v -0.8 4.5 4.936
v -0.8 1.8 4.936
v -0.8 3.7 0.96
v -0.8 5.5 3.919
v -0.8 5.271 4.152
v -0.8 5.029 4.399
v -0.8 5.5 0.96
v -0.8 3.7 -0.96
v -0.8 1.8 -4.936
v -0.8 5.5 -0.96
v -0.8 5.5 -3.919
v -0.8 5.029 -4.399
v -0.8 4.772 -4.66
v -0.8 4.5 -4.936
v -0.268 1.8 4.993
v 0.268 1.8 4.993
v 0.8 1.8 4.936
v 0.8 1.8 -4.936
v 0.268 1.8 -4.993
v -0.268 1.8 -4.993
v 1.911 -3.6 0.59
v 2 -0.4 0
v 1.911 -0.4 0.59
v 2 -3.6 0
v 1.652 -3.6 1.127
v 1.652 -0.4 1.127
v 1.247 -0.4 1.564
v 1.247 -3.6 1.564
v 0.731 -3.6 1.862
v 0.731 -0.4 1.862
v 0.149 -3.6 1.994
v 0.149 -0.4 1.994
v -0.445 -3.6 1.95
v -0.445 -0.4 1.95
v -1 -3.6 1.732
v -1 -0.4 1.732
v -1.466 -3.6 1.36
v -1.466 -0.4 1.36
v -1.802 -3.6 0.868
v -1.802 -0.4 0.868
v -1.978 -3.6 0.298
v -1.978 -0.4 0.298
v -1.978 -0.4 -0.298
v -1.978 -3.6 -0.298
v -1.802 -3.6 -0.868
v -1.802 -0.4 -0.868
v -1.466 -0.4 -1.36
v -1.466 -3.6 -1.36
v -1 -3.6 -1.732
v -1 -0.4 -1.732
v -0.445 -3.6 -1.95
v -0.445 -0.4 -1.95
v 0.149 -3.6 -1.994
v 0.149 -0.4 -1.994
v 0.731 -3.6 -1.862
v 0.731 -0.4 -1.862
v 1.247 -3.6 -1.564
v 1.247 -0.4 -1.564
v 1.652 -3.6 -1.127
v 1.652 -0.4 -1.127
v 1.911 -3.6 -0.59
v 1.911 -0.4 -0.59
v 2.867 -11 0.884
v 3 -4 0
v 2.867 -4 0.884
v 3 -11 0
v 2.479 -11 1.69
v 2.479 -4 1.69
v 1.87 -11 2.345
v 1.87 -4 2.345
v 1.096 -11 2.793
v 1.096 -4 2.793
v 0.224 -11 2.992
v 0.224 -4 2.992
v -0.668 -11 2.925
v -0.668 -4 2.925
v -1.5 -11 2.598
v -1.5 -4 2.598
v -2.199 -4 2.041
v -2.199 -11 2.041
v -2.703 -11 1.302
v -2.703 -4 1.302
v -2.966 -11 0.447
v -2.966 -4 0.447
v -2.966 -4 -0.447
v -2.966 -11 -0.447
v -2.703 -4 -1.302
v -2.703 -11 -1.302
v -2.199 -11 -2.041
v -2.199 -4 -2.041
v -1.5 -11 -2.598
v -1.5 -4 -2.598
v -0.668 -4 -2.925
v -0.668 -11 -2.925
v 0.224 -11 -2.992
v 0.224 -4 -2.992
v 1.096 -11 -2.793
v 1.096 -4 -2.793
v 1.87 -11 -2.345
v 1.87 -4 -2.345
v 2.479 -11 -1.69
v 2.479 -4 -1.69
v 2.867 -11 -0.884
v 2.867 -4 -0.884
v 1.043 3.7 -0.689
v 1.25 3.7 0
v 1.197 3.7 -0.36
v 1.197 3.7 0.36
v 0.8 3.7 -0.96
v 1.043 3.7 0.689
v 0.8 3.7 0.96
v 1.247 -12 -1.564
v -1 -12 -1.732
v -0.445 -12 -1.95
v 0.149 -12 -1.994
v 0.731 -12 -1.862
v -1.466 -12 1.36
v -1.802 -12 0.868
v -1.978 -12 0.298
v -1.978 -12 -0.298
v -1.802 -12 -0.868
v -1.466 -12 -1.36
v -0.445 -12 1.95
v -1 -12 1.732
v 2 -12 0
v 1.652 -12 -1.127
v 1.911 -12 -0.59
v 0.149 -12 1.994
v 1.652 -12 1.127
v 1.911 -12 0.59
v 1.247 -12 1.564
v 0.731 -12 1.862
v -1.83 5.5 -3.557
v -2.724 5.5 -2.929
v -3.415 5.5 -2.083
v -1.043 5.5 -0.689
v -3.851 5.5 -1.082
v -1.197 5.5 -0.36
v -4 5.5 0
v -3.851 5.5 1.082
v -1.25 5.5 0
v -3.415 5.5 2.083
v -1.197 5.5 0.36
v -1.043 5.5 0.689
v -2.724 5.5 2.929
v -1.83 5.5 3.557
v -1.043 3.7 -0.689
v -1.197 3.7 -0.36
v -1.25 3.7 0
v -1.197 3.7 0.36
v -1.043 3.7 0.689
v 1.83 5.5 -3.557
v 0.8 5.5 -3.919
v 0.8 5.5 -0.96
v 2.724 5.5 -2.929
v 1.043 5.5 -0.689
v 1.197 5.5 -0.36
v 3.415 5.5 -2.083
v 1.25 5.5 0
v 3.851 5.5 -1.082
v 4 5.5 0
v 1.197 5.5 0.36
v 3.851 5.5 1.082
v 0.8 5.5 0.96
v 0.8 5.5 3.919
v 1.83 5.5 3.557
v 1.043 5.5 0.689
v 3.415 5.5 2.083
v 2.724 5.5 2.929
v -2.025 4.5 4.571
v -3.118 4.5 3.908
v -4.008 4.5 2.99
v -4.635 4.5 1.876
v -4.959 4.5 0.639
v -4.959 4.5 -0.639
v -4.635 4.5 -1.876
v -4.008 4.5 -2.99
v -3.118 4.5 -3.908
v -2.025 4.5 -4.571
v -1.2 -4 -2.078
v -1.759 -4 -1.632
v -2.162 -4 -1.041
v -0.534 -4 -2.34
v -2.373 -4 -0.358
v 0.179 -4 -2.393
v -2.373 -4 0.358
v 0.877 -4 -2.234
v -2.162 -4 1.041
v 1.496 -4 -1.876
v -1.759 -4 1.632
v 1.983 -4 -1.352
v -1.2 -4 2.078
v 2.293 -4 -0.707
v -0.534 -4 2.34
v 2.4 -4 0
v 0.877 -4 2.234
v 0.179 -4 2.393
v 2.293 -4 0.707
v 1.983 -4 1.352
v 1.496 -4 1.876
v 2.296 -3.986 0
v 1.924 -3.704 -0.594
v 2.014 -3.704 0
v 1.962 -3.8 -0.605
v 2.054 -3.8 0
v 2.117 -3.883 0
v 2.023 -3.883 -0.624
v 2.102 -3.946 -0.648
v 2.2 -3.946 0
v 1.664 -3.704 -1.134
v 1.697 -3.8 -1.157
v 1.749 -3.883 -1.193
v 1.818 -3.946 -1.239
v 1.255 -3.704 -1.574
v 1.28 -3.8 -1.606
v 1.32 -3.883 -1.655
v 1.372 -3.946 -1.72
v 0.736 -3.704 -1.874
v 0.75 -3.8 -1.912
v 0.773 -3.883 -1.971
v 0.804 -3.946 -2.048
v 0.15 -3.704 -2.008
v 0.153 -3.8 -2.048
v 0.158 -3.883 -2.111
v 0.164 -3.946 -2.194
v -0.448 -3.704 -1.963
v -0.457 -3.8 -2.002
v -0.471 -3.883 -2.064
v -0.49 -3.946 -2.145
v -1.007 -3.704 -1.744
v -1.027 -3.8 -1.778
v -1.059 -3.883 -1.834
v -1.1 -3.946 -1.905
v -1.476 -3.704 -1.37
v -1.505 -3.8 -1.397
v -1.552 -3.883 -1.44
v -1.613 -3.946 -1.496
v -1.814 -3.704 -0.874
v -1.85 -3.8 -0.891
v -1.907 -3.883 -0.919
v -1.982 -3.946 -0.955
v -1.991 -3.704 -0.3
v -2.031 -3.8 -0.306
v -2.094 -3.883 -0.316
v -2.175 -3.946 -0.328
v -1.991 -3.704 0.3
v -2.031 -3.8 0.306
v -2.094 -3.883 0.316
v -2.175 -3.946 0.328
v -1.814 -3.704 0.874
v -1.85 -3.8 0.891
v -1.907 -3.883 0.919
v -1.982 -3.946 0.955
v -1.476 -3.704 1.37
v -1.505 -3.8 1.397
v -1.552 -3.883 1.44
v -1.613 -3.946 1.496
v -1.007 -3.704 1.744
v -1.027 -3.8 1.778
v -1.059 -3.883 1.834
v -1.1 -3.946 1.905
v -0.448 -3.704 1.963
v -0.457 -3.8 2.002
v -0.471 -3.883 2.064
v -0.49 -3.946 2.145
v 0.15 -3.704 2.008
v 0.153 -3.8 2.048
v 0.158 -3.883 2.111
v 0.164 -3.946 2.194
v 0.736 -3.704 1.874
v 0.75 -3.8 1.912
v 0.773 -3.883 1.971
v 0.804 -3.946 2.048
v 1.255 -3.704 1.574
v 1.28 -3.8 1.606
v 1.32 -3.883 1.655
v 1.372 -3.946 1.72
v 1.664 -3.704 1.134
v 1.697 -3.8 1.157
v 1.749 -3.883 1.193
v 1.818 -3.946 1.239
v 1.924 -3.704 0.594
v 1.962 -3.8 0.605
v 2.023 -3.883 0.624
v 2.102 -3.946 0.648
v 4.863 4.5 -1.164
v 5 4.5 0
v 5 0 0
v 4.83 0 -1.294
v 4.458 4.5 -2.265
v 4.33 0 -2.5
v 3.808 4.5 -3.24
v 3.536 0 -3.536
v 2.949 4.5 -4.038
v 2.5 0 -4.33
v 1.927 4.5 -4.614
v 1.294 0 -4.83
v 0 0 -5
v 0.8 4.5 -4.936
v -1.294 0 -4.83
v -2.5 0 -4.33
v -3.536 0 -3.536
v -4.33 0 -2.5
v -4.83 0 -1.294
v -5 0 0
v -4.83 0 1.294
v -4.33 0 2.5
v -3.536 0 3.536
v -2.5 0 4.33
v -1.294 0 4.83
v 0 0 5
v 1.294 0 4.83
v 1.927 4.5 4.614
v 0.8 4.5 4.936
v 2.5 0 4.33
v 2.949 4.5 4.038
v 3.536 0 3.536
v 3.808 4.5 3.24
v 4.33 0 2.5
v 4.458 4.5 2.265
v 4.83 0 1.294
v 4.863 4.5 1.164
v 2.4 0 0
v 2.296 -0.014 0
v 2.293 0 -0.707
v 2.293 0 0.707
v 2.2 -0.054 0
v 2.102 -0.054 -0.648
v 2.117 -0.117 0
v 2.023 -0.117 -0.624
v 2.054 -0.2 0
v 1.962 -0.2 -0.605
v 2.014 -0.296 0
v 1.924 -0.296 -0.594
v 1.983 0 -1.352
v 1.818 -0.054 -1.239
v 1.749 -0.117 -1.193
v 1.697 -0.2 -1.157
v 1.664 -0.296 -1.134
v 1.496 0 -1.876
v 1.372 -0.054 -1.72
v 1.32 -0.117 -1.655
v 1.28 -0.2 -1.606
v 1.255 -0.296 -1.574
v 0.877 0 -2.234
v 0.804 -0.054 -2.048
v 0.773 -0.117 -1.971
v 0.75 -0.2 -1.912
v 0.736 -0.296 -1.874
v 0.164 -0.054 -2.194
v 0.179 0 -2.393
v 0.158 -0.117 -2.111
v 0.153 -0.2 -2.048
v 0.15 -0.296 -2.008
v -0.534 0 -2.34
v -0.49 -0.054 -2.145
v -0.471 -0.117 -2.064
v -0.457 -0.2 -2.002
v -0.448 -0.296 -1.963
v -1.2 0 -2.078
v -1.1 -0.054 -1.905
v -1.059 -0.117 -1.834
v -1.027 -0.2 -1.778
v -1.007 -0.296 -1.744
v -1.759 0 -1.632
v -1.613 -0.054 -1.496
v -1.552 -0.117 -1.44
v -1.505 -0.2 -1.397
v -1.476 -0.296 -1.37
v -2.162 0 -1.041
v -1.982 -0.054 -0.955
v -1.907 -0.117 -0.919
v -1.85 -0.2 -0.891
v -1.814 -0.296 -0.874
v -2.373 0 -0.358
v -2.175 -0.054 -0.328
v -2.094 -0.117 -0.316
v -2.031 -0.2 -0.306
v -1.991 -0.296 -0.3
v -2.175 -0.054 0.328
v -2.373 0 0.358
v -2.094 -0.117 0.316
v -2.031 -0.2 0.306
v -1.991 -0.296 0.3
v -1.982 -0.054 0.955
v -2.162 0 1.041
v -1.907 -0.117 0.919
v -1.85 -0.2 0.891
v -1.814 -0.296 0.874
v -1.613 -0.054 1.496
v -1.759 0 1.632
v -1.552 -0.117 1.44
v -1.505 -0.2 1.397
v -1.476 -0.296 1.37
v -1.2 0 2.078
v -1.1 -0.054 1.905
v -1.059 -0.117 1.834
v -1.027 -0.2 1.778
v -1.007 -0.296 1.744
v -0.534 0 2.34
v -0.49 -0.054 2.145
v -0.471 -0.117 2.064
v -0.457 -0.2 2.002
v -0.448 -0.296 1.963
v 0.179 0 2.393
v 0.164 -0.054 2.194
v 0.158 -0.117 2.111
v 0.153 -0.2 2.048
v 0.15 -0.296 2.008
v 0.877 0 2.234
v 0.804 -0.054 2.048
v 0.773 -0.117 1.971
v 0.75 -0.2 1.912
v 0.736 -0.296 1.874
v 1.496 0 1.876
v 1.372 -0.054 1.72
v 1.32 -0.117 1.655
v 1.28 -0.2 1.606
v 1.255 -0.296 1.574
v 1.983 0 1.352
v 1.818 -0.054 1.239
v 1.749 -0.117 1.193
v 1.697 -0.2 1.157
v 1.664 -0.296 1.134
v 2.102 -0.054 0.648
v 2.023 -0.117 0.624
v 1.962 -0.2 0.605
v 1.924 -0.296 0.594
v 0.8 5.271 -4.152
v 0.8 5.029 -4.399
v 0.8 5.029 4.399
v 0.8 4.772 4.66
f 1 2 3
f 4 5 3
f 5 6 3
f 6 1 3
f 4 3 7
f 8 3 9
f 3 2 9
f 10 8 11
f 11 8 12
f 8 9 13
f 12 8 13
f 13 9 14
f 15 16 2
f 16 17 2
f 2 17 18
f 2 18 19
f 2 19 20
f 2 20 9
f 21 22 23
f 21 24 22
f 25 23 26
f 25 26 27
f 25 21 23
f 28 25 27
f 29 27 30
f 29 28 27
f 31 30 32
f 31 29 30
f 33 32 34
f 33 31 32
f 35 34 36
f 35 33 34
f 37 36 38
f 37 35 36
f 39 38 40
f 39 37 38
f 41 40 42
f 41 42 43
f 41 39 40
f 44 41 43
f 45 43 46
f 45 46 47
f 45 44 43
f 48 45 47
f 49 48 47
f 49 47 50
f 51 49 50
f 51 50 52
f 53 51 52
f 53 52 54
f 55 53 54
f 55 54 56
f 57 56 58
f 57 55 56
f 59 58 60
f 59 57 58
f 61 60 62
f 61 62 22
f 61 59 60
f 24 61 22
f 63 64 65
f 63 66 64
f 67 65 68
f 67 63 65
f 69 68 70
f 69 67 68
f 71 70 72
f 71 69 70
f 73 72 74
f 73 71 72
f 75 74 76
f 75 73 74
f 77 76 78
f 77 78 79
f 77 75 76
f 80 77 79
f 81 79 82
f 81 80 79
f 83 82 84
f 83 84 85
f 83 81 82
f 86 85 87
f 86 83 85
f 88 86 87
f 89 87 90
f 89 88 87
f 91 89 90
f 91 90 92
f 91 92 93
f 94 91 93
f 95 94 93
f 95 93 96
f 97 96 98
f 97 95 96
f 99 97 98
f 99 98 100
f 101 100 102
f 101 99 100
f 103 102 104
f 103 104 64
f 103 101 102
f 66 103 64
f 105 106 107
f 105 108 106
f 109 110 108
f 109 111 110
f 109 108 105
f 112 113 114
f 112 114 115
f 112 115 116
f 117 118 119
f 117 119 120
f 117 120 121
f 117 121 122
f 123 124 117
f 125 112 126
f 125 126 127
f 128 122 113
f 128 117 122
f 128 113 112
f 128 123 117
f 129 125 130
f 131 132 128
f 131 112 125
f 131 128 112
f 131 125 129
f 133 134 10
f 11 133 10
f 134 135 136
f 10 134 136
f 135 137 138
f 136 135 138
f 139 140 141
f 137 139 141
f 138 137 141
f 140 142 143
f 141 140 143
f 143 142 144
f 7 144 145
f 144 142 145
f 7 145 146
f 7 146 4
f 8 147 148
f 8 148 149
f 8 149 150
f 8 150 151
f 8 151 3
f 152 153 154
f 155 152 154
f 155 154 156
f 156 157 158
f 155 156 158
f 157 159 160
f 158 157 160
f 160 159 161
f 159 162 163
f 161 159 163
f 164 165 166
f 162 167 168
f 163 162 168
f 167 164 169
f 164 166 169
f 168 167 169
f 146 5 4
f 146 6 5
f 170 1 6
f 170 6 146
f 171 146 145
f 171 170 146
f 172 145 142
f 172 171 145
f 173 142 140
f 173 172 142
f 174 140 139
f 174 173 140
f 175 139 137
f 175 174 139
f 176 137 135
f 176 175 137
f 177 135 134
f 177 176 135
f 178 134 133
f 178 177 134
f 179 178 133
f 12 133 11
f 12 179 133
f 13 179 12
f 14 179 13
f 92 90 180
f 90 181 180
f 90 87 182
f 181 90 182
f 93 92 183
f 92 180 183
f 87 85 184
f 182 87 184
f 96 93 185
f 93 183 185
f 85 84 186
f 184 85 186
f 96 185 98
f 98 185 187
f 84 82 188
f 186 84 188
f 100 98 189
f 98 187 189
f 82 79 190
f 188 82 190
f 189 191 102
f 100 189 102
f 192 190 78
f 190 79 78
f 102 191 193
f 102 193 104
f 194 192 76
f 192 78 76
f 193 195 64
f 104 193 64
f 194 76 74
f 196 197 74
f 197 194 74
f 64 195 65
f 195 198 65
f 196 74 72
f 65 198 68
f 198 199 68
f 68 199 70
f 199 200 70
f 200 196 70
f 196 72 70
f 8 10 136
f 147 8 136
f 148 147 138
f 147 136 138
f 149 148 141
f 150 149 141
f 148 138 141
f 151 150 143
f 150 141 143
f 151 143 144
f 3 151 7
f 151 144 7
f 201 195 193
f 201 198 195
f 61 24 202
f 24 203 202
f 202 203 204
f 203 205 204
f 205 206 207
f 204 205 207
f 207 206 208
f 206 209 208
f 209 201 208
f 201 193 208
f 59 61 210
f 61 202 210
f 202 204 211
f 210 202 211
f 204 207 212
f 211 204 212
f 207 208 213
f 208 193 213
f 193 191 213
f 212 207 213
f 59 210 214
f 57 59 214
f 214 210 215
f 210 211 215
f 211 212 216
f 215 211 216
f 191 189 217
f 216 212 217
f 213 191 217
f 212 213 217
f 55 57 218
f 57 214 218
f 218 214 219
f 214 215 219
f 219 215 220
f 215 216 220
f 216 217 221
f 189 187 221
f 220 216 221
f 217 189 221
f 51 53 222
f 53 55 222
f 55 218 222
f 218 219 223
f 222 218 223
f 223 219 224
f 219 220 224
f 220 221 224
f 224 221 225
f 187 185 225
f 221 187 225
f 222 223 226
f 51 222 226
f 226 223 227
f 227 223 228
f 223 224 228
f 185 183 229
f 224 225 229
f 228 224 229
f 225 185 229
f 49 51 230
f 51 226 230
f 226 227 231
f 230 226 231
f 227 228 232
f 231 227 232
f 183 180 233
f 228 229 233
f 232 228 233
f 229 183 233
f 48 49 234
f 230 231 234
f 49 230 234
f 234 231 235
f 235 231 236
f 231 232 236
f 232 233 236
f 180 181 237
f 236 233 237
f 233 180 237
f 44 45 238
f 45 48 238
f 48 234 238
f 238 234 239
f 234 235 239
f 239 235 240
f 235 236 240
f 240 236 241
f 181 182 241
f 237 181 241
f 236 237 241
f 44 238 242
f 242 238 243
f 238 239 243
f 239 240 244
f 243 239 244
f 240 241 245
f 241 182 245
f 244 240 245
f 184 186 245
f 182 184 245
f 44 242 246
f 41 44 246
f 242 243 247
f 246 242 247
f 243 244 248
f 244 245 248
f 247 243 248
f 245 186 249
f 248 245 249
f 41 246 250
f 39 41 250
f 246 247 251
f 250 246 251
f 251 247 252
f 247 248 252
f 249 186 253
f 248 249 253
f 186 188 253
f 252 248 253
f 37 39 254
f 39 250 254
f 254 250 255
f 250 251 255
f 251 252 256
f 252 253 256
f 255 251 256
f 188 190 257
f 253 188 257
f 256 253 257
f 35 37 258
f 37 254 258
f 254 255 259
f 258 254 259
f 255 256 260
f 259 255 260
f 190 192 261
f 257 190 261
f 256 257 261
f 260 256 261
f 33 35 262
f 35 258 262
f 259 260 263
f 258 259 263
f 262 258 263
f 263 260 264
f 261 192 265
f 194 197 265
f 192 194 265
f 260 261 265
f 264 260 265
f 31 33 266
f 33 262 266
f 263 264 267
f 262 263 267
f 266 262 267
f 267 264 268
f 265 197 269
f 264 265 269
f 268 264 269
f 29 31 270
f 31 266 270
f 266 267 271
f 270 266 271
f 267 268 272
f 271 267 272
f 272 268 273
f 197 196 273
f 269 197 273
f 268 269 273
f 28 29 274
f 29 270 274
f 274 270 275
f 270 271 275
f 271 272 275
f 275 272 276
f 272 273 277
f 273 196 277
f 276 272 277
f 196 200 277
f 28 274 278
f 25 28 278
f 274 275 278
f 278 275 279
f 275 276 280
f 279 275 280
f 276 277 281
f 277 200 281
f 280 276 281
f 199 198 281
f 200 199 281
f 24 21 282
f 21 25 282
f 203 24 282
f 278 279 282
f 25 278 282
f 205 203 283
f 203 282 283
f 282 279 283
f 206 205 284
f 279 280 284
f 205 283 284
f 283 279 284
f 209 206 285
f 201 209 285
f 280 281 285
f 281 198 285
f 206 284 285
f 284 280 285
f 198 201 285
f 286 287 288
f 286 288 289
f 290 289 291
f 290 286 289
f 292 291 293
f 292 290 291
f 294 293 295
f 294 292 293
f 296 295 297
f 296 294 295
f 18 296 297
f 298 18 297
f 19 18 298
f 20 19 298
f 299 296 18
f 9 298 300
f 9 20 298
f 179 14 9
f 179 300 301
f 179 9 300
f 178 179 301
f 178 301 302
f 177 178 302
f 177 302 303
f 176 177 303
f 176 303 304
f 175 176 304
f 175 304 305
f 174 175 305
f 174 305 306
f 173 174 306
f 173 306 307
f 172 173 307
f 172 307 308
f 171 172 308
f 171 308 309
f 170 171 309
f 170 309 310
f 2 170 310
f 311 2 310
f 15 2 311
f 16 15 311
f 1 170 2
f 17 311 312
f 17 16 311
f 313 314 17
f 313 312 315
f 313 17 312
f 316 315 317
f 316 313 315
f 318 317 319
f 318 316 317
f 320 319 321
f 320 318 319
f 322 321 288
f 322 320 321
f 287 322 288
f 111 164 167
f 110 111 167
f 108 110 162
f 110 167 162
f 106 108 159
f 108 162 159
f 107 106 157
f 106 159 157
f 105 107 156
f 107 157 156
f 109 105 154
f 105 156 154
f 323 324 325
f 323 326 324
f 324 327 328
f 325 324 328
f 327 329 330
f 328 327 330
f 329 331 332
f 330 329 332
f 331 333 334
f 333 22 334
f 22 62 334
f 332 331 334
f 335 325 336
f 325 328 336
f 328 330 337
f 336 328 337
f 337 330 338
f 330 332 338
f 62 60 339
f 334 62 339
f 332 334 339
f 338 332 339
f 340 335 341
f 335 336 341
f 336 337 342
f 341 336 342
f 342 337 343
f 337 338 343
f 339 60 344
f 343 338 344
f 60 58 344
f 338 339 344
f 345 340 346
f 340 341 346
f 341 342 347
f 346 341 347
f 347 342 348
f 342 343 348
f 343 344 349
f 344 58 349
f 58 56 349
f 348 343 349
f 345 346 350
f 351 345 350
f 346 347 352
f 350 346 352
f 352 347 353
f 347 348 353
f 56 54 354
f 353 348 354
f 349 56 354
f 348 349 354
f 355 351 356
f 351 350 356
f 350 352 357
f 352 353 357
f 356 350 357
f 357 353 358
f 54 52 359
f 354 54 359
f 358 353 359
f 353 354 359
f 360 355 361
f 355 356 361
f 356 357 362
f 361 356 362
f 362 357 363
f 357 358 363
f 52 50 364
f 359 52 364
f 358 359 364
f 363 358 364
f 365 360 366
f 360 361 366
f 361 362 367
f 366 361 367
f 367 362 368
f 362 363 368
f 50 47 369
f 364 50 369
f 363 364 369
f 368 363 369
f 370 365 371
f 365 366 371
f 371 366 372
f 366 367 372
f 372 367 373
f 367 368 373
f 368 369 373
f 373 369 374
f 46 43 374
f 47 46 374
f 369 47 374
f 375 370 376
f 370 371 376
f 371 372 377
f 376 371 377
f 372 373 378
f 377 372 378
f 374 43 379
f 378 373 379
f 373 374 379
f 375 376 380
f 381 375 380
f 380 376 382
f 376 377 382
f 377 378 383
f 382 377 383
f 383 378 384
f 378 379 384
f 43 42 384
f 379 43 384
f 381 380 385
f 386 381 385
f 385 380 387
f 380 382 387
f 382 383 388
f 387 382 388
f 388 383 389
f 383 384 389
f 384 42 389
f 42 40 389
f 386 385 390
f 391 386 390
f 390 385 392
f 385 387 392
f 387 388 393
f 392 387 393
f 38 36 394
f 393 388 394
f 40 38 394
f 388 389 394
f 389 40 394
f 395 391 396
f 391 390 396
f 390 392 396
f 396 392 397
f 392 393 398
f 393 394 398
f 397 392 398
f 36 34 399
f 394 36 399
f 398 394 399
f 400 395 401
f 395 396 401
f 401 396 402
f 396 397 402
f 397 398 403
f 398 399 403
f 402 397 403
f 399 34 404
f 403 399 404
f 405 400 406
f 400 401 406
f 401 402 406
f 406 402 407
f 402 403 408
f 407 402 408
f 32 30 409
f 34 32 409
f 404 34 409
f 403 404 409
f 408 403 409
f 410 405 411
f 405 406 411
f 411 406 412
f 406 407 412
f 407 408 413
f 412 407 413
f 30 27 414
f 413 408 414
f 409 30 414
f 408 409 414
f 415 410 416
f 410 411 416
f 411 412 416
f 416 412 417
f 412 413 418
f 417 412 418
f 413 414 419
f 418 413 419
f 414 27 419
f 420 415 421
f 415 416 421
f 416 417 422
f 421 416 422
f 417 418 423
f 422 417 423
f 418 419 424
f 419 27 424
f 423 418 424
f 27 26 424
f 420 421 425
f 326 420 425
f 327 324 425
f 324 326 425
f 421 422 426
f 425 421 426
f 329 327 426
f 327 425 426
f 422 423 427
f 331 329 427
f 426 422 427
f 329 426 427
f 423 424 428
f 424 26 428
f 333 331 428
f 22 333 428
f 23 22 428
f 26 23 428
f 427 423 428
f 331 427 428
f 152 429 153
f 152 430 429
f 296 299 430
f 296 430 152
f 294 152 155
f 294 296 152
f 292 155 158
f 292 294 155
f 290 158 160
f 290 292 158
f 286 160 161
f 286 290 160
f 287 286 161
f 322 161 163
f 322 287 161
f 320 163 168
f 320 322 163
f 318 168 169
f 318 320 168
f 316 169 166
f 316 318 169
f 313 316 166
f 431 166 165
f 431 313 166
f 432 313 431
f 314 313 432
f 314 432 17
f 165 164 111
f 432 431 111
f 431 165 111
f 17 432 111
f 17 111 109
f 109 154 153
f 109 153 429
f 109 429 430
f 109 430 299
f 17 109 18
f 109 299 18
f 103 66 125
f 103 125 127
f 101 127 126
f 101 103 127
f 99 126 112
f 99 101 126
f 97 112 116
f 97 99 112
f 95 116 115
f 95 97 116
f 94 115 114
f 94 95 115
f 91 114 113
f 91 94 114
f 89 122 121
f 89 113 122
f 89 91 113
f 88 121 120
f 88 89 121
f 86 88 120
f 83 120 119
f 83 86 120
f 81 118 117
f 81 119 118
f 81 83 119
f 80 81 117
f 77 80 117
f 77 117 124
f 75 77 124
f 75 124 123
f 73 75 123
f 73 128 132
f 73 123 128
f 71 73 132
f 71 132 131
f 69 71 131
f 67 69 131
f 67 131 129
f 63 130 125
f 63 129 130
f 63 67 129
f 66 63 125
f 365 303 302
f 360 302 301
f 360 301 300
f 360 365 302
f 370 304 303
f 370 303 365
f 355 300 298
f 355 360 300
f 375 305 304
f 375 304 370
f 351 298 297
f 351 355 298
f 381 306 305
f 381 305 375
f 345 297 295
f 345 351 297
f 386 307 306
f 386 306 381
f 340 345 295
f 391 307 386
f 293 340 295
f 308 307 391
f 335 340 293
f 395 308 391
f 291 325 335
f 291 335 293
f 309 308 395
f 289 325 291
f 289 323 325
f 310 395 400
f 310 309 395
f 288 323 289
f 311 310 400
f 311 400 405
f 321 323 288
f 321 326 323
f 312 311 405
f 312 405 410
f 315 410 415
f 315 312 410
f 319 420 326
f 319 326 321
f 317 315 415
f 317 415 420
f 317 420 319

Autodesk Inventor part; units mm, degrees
ref_plane "YZ Plane" through (0, 0, 0) normal (1, 0, 0) x (0, 1, 0)
ref_plane "XZ Plane" through (0, 0, 0) normal (0, 1, 0) x (-1, 0, 0)
ref_plane "XY Plane" through (0, 0, 0) normal (0, 0, 1) x (1, 0, 0)
sketch "Sketch1" plane through (0, 0, 0) normal (0, 0, 1) x (1, 0, 0)
  line L0 (5, 0) -> (5, 5.5)
  line L1 (5, 5.5) -> (0, 5.5)
  line L2 (5, 0) -> (2, 0)
  line L3 (2, 0) -> (2, -4)
  line L4 (2, -4) -> (3, -4)
  line L5 (3, -4) -> (3, -12)
  line L6 (3, -12) -> (0, -12)
  line L7 (0, 5.5) -> (0, -12)
  point P0 (0, 0)
  dimension "d0" = 10
  dimension "d2" = 4
  dimension "d3" = 6
  dimension "d4" = 5.5
  dimension "d5" = 8
  dimension "d6" = 12
revolve "Вращение1" add sketch "Sketch1" angle 360 about axis through (0, 5.5, 0) along (0, -1, 0)
sketch "Sketch2" plane through (0, 5.5, 0) normal (0, 1, 0) x (1, 0, 0)
  circle A0 centre (0, 0) radius 5 construction
  circle A1 centre (0, 0) radius 1.25
  dimension "d31" = 2.5
extrude "Выдавливание1" cut sketch "Sketch2" against normal blind 1.8
chamfer "Фаска1" distance 1 angle 45 1 edges at (-5, 5.5, 0)
sketch "Sketch3" plane through (0, 0, 0) normal (0, 0, 1) x (1, 0, 0)
  line L0 (0, 0) -> (0, 5.5)
  line L1 (-2.3552, 0) -> (2.3552, 0) construction
  line L2 (-5, 5.5) -> (5, 5.5) construction
  line L3 (-0.8, 5.5) -> (0.8, 5.5)
  line L4 (0.8, 5.5) -> (0.8, 1.8)
  line L5 (0.8, 1.8) -> (-0.8, 1.8)
  line L6 (-0.8, 1.8) -> (-0.8, 5.5)
  dimension "d8" = 1.8
  dimension "d9" = 1.6
extrude "Выдавливание2" cut sketch "Sketch3" along normal through all both and the other way through all
fillet "Сопряжение1" radius 0.4 2 edges at (-2, 0, 0) (-2, -4, 0)
thread "Резьба1" size "M6x1" class "6g" standard "ISO Metric profile" length 8
chamfer "Фаска2" distance 1 angle 45 1 edges at (-3, -12, 0)
equation "\"d31\" = d3_"
equation "\"d32\" = h3"
equation "\"d21\" = C1"
equation "\"d8\" = h2"
equation "\"d9\" = n"
equation "\"d12\" = R"
equation "\"d13\" = b"
equation "\"d15\" = C1"
equation "\"d0\" = D"
equation "\"d2\" = d1"
equation "\"d3\" = d_"
equation "\"d4\" = k1"
equation "\"d5\" = b"
equation "\"d6\" = l_"
equation "\"D\" = 10"
equation "\"d_\" = 6"
equation "\"l_\" = 12"
equation "\"b\" = 8"
equation "\"d1\" = 4"
equation "\"R\" = 0.4"
equation "\"C1\" = 1"
equation "\"h2\" = 1.8"
equation "\"n\" = 1.6"
equation "\"h3\" = 1.8"
equation "\"k1\" = 5.5"
equation "\"d3_\" = 2.5"
equation "\"G\" = l_ - b"
properties part number "Винт 3 M6-6gx12 ГОСТ 10336-80" material "Сталь, мягкая"
